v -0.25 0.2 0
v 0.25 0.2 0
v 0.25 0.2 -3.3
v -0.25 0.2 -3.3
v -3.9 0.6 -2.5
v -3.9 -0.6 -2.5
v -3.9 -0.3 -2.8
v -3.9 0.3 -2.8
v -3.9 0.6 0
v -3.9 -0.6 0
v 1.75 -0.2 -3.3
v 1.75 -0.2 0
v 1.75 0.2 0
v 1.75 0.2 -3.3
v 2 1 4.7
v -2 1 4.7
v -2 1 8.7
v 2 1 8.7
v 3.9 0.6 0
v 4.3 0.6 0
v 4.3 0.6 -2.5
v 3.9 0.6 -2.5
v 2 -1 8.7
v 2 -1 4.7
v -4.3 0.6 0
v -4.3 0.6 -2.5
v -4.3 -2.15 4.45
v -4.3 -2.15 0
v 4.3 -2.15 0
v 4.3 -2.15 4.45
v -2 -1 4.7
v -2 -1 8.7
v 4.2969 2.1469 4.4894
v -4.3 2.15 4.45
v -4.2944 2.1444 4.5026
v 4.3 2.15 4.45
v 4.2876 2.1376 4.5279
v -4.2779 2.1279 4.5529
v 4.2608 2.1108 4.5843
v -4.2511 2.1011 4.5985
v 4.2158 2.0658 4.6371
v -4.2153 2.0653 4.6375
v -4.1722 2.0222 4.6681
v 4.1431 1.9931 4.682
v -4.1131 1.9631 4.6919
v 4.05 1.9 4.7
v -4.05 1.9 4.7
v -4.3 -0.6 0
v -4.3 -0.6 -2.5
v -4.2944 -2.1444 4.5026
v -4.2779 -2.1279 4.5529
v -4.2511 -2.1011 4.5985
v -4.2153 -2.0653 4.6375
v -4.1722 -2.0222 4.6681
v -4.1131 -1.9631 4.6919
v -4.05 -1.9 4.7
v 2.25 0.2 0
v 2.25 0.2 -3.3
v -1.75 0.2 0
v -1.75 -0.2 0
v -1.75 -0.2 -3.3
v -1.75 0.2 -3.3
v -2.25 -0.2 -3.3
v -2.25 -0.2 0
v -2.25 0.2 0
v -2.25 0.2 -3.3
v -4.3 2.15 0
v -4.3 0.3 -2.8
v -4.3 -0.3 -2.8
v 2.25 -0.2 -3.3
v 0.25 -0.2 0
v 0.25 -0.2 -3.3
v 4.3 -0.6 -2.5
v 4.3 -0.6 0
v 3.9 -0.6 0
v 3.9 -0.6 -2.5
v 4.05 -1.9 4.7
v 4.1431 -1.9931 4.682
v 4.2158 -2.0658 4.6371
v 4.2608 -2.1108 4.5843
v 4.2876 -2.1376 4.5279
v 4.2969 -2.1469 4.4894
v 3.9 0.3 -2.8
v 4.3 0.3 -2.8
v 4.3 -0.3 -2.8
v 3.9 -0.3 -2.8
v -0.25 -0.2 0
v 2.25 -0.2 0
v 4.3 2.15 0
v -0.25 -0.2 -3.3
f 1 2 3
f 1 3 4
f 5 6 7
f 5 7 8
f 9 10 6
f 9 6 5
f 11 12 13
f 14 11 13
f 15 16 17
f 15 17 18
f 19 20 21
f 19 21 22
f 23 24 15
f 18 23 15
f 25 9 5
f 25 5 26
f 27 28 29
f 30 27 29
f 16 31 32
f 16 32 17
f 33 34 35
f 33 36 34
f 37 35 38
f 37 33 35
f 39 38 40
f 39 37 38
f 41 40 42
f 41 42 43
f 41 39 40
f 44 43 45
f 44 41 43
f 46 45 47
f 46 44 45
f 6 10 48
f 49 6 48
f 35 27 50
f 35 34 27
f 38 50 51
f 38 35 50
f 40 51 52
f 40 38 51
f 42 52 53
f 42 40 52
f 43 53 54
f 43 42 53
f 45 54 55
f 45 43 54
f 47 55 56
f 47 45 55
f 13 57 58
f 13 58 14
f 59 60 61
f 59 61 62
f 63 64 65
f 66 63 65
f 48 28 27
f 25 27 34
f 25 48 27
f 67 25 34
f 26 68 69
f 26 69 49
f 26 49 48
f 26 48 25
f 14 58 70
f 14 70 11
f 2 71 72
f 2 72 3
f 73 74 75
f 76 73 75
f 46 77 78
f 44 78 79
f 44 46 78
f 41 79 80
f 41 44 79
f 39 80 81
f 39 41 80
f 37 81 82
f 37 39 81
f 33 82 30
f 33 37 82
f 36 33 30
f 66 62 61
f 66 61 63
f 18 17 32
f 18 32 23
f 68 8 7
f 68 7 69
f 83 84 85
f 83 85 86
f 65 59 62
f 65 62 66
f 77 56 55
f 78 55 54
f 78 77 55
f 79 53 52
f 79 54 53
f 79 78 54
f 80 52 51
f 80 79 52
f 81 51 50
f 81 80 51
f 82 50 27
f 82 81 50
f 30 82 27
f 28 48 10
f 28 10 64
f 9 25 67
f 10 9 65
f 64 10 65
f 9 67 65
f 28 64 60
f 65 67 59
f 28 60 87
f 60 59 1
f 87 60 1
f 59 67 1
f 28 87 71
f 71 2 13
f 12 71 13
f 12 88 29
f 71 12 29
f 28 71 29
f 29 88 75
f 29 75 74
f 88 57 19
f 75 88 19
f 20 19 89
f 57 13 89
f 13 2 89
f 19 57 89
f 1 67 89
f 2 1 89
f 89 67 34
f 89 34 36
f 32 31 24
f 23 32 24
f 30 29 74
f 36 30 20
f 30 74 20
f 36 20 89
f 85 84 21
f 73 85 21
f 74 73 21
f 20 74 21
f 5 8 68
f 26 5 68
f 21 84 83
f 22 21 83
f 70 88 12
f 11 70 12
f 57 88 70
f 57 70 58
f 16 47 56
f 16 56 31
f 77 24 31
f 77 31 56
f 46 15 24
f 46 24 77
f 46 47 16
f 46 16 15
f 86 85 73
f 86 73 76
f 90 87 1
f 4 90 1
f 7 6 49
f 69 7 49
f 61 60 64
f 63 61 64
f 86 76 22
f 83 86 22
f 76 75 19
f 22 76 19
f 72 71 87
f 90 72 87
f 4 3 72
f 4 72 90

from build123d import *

# Parameters (mm, degrees)
SKETCH1_W           = 8.6
SKETCH1_H           = 4.3
BOSS_EXTRUDE1_DEPTH = 4.7
SKETCH2_W           = 4
SKETCH2_H           = 2
BOSS_EXTRUDE2_DEPTH = 4
SKETCH3_W           = 0.4
SKETCH3_H           = 1.2
BOSS_EXTRUDE3_DEPTH = 2.8
SKETCH4_W           = 0.5
SKETCH4_H           = 0.4
BOSS_EXTRUDE4_DEPTH = 3.3
CHAMFER1_SIZE       = 0.3
FILLET1_R           = 0.25


with BuildPart() as part:
    # Sketch1 → Boss-Extrude1 (new body)
    with BuildSketch(Plane.XY):
        Rectangle(SKETCH1_W, SKETCH1_H)
    extrude(amount=BOSS_EXTRUDE1_DEPTH)

    # Sketch2 → Boss-Extrude2 (add)
    with BuildSketch(Plane.XY.offset(4.7)):
        Rectangle(SKETCH2_W, SKETCH2_H)
    extrude(amount=BOSS_EXTRUDE2_DEPTH)

    # Sketch3 → Boss-Extrude3 (add)
    with BuildSketch(Plane(origin=(0, 0, 0), x_dir=(-1, 0, 0), z_dir=(0, 0, -1))):
        with Locations((-4.1, 0)):
            Rectangle(SKETCH3_W, SKETCH3_H)
        with Locations((4.1, 0)):
            Rectangle(SKETCH3_W, SKETCH3_H)
    extrude(amount=BOSS_EXTRUDE3_DEPTH)

    # Sketch4 → Boss-Extrude4 (add)
    with BuildSketch(Plane(origin=(0, 0, 0), x_dir=(-1, 0, 0), z_dir=(0, 0, -1))):
        with Locations((2, 0)):
            Rectangle(SKETCH4_W, SKETCH4_H)
        Rectangle(SKETCH4_W, SKETCH4_H)
        with Locations((-2, 0)):
            Rectangle(SKETCH4_W, SKETCH4_H)
    extrude(amount=BOSS_EXTRUDE4_DEPTH)

    # Chamfer1
    chamfer1_edges = [part.edges().sort_by_distance(p)[0] for p in [
        (4.1, 0.6, -2.8),
        (4.1, -0.6, -2.8),
        (-4.1, 0.6, -2.8),
        (-4.1, -0.6, -2.8),
    ]]
    chamfer(chamfer1_edges, length=CHAMFER1_SIZE)

    # Fillet1
    fillet1_edges = [part.edges().sort_by_distance(p)[0] for p in [
        (-4.3, 0, 4.7),
        (0, -2.15, 4.7),
        (4.3, 0, 4.7),
        (0, 2.15, 4.7),
    ]]
    fillet(fillet1_edges, radius=FILLET1_R)


solid = part.part
